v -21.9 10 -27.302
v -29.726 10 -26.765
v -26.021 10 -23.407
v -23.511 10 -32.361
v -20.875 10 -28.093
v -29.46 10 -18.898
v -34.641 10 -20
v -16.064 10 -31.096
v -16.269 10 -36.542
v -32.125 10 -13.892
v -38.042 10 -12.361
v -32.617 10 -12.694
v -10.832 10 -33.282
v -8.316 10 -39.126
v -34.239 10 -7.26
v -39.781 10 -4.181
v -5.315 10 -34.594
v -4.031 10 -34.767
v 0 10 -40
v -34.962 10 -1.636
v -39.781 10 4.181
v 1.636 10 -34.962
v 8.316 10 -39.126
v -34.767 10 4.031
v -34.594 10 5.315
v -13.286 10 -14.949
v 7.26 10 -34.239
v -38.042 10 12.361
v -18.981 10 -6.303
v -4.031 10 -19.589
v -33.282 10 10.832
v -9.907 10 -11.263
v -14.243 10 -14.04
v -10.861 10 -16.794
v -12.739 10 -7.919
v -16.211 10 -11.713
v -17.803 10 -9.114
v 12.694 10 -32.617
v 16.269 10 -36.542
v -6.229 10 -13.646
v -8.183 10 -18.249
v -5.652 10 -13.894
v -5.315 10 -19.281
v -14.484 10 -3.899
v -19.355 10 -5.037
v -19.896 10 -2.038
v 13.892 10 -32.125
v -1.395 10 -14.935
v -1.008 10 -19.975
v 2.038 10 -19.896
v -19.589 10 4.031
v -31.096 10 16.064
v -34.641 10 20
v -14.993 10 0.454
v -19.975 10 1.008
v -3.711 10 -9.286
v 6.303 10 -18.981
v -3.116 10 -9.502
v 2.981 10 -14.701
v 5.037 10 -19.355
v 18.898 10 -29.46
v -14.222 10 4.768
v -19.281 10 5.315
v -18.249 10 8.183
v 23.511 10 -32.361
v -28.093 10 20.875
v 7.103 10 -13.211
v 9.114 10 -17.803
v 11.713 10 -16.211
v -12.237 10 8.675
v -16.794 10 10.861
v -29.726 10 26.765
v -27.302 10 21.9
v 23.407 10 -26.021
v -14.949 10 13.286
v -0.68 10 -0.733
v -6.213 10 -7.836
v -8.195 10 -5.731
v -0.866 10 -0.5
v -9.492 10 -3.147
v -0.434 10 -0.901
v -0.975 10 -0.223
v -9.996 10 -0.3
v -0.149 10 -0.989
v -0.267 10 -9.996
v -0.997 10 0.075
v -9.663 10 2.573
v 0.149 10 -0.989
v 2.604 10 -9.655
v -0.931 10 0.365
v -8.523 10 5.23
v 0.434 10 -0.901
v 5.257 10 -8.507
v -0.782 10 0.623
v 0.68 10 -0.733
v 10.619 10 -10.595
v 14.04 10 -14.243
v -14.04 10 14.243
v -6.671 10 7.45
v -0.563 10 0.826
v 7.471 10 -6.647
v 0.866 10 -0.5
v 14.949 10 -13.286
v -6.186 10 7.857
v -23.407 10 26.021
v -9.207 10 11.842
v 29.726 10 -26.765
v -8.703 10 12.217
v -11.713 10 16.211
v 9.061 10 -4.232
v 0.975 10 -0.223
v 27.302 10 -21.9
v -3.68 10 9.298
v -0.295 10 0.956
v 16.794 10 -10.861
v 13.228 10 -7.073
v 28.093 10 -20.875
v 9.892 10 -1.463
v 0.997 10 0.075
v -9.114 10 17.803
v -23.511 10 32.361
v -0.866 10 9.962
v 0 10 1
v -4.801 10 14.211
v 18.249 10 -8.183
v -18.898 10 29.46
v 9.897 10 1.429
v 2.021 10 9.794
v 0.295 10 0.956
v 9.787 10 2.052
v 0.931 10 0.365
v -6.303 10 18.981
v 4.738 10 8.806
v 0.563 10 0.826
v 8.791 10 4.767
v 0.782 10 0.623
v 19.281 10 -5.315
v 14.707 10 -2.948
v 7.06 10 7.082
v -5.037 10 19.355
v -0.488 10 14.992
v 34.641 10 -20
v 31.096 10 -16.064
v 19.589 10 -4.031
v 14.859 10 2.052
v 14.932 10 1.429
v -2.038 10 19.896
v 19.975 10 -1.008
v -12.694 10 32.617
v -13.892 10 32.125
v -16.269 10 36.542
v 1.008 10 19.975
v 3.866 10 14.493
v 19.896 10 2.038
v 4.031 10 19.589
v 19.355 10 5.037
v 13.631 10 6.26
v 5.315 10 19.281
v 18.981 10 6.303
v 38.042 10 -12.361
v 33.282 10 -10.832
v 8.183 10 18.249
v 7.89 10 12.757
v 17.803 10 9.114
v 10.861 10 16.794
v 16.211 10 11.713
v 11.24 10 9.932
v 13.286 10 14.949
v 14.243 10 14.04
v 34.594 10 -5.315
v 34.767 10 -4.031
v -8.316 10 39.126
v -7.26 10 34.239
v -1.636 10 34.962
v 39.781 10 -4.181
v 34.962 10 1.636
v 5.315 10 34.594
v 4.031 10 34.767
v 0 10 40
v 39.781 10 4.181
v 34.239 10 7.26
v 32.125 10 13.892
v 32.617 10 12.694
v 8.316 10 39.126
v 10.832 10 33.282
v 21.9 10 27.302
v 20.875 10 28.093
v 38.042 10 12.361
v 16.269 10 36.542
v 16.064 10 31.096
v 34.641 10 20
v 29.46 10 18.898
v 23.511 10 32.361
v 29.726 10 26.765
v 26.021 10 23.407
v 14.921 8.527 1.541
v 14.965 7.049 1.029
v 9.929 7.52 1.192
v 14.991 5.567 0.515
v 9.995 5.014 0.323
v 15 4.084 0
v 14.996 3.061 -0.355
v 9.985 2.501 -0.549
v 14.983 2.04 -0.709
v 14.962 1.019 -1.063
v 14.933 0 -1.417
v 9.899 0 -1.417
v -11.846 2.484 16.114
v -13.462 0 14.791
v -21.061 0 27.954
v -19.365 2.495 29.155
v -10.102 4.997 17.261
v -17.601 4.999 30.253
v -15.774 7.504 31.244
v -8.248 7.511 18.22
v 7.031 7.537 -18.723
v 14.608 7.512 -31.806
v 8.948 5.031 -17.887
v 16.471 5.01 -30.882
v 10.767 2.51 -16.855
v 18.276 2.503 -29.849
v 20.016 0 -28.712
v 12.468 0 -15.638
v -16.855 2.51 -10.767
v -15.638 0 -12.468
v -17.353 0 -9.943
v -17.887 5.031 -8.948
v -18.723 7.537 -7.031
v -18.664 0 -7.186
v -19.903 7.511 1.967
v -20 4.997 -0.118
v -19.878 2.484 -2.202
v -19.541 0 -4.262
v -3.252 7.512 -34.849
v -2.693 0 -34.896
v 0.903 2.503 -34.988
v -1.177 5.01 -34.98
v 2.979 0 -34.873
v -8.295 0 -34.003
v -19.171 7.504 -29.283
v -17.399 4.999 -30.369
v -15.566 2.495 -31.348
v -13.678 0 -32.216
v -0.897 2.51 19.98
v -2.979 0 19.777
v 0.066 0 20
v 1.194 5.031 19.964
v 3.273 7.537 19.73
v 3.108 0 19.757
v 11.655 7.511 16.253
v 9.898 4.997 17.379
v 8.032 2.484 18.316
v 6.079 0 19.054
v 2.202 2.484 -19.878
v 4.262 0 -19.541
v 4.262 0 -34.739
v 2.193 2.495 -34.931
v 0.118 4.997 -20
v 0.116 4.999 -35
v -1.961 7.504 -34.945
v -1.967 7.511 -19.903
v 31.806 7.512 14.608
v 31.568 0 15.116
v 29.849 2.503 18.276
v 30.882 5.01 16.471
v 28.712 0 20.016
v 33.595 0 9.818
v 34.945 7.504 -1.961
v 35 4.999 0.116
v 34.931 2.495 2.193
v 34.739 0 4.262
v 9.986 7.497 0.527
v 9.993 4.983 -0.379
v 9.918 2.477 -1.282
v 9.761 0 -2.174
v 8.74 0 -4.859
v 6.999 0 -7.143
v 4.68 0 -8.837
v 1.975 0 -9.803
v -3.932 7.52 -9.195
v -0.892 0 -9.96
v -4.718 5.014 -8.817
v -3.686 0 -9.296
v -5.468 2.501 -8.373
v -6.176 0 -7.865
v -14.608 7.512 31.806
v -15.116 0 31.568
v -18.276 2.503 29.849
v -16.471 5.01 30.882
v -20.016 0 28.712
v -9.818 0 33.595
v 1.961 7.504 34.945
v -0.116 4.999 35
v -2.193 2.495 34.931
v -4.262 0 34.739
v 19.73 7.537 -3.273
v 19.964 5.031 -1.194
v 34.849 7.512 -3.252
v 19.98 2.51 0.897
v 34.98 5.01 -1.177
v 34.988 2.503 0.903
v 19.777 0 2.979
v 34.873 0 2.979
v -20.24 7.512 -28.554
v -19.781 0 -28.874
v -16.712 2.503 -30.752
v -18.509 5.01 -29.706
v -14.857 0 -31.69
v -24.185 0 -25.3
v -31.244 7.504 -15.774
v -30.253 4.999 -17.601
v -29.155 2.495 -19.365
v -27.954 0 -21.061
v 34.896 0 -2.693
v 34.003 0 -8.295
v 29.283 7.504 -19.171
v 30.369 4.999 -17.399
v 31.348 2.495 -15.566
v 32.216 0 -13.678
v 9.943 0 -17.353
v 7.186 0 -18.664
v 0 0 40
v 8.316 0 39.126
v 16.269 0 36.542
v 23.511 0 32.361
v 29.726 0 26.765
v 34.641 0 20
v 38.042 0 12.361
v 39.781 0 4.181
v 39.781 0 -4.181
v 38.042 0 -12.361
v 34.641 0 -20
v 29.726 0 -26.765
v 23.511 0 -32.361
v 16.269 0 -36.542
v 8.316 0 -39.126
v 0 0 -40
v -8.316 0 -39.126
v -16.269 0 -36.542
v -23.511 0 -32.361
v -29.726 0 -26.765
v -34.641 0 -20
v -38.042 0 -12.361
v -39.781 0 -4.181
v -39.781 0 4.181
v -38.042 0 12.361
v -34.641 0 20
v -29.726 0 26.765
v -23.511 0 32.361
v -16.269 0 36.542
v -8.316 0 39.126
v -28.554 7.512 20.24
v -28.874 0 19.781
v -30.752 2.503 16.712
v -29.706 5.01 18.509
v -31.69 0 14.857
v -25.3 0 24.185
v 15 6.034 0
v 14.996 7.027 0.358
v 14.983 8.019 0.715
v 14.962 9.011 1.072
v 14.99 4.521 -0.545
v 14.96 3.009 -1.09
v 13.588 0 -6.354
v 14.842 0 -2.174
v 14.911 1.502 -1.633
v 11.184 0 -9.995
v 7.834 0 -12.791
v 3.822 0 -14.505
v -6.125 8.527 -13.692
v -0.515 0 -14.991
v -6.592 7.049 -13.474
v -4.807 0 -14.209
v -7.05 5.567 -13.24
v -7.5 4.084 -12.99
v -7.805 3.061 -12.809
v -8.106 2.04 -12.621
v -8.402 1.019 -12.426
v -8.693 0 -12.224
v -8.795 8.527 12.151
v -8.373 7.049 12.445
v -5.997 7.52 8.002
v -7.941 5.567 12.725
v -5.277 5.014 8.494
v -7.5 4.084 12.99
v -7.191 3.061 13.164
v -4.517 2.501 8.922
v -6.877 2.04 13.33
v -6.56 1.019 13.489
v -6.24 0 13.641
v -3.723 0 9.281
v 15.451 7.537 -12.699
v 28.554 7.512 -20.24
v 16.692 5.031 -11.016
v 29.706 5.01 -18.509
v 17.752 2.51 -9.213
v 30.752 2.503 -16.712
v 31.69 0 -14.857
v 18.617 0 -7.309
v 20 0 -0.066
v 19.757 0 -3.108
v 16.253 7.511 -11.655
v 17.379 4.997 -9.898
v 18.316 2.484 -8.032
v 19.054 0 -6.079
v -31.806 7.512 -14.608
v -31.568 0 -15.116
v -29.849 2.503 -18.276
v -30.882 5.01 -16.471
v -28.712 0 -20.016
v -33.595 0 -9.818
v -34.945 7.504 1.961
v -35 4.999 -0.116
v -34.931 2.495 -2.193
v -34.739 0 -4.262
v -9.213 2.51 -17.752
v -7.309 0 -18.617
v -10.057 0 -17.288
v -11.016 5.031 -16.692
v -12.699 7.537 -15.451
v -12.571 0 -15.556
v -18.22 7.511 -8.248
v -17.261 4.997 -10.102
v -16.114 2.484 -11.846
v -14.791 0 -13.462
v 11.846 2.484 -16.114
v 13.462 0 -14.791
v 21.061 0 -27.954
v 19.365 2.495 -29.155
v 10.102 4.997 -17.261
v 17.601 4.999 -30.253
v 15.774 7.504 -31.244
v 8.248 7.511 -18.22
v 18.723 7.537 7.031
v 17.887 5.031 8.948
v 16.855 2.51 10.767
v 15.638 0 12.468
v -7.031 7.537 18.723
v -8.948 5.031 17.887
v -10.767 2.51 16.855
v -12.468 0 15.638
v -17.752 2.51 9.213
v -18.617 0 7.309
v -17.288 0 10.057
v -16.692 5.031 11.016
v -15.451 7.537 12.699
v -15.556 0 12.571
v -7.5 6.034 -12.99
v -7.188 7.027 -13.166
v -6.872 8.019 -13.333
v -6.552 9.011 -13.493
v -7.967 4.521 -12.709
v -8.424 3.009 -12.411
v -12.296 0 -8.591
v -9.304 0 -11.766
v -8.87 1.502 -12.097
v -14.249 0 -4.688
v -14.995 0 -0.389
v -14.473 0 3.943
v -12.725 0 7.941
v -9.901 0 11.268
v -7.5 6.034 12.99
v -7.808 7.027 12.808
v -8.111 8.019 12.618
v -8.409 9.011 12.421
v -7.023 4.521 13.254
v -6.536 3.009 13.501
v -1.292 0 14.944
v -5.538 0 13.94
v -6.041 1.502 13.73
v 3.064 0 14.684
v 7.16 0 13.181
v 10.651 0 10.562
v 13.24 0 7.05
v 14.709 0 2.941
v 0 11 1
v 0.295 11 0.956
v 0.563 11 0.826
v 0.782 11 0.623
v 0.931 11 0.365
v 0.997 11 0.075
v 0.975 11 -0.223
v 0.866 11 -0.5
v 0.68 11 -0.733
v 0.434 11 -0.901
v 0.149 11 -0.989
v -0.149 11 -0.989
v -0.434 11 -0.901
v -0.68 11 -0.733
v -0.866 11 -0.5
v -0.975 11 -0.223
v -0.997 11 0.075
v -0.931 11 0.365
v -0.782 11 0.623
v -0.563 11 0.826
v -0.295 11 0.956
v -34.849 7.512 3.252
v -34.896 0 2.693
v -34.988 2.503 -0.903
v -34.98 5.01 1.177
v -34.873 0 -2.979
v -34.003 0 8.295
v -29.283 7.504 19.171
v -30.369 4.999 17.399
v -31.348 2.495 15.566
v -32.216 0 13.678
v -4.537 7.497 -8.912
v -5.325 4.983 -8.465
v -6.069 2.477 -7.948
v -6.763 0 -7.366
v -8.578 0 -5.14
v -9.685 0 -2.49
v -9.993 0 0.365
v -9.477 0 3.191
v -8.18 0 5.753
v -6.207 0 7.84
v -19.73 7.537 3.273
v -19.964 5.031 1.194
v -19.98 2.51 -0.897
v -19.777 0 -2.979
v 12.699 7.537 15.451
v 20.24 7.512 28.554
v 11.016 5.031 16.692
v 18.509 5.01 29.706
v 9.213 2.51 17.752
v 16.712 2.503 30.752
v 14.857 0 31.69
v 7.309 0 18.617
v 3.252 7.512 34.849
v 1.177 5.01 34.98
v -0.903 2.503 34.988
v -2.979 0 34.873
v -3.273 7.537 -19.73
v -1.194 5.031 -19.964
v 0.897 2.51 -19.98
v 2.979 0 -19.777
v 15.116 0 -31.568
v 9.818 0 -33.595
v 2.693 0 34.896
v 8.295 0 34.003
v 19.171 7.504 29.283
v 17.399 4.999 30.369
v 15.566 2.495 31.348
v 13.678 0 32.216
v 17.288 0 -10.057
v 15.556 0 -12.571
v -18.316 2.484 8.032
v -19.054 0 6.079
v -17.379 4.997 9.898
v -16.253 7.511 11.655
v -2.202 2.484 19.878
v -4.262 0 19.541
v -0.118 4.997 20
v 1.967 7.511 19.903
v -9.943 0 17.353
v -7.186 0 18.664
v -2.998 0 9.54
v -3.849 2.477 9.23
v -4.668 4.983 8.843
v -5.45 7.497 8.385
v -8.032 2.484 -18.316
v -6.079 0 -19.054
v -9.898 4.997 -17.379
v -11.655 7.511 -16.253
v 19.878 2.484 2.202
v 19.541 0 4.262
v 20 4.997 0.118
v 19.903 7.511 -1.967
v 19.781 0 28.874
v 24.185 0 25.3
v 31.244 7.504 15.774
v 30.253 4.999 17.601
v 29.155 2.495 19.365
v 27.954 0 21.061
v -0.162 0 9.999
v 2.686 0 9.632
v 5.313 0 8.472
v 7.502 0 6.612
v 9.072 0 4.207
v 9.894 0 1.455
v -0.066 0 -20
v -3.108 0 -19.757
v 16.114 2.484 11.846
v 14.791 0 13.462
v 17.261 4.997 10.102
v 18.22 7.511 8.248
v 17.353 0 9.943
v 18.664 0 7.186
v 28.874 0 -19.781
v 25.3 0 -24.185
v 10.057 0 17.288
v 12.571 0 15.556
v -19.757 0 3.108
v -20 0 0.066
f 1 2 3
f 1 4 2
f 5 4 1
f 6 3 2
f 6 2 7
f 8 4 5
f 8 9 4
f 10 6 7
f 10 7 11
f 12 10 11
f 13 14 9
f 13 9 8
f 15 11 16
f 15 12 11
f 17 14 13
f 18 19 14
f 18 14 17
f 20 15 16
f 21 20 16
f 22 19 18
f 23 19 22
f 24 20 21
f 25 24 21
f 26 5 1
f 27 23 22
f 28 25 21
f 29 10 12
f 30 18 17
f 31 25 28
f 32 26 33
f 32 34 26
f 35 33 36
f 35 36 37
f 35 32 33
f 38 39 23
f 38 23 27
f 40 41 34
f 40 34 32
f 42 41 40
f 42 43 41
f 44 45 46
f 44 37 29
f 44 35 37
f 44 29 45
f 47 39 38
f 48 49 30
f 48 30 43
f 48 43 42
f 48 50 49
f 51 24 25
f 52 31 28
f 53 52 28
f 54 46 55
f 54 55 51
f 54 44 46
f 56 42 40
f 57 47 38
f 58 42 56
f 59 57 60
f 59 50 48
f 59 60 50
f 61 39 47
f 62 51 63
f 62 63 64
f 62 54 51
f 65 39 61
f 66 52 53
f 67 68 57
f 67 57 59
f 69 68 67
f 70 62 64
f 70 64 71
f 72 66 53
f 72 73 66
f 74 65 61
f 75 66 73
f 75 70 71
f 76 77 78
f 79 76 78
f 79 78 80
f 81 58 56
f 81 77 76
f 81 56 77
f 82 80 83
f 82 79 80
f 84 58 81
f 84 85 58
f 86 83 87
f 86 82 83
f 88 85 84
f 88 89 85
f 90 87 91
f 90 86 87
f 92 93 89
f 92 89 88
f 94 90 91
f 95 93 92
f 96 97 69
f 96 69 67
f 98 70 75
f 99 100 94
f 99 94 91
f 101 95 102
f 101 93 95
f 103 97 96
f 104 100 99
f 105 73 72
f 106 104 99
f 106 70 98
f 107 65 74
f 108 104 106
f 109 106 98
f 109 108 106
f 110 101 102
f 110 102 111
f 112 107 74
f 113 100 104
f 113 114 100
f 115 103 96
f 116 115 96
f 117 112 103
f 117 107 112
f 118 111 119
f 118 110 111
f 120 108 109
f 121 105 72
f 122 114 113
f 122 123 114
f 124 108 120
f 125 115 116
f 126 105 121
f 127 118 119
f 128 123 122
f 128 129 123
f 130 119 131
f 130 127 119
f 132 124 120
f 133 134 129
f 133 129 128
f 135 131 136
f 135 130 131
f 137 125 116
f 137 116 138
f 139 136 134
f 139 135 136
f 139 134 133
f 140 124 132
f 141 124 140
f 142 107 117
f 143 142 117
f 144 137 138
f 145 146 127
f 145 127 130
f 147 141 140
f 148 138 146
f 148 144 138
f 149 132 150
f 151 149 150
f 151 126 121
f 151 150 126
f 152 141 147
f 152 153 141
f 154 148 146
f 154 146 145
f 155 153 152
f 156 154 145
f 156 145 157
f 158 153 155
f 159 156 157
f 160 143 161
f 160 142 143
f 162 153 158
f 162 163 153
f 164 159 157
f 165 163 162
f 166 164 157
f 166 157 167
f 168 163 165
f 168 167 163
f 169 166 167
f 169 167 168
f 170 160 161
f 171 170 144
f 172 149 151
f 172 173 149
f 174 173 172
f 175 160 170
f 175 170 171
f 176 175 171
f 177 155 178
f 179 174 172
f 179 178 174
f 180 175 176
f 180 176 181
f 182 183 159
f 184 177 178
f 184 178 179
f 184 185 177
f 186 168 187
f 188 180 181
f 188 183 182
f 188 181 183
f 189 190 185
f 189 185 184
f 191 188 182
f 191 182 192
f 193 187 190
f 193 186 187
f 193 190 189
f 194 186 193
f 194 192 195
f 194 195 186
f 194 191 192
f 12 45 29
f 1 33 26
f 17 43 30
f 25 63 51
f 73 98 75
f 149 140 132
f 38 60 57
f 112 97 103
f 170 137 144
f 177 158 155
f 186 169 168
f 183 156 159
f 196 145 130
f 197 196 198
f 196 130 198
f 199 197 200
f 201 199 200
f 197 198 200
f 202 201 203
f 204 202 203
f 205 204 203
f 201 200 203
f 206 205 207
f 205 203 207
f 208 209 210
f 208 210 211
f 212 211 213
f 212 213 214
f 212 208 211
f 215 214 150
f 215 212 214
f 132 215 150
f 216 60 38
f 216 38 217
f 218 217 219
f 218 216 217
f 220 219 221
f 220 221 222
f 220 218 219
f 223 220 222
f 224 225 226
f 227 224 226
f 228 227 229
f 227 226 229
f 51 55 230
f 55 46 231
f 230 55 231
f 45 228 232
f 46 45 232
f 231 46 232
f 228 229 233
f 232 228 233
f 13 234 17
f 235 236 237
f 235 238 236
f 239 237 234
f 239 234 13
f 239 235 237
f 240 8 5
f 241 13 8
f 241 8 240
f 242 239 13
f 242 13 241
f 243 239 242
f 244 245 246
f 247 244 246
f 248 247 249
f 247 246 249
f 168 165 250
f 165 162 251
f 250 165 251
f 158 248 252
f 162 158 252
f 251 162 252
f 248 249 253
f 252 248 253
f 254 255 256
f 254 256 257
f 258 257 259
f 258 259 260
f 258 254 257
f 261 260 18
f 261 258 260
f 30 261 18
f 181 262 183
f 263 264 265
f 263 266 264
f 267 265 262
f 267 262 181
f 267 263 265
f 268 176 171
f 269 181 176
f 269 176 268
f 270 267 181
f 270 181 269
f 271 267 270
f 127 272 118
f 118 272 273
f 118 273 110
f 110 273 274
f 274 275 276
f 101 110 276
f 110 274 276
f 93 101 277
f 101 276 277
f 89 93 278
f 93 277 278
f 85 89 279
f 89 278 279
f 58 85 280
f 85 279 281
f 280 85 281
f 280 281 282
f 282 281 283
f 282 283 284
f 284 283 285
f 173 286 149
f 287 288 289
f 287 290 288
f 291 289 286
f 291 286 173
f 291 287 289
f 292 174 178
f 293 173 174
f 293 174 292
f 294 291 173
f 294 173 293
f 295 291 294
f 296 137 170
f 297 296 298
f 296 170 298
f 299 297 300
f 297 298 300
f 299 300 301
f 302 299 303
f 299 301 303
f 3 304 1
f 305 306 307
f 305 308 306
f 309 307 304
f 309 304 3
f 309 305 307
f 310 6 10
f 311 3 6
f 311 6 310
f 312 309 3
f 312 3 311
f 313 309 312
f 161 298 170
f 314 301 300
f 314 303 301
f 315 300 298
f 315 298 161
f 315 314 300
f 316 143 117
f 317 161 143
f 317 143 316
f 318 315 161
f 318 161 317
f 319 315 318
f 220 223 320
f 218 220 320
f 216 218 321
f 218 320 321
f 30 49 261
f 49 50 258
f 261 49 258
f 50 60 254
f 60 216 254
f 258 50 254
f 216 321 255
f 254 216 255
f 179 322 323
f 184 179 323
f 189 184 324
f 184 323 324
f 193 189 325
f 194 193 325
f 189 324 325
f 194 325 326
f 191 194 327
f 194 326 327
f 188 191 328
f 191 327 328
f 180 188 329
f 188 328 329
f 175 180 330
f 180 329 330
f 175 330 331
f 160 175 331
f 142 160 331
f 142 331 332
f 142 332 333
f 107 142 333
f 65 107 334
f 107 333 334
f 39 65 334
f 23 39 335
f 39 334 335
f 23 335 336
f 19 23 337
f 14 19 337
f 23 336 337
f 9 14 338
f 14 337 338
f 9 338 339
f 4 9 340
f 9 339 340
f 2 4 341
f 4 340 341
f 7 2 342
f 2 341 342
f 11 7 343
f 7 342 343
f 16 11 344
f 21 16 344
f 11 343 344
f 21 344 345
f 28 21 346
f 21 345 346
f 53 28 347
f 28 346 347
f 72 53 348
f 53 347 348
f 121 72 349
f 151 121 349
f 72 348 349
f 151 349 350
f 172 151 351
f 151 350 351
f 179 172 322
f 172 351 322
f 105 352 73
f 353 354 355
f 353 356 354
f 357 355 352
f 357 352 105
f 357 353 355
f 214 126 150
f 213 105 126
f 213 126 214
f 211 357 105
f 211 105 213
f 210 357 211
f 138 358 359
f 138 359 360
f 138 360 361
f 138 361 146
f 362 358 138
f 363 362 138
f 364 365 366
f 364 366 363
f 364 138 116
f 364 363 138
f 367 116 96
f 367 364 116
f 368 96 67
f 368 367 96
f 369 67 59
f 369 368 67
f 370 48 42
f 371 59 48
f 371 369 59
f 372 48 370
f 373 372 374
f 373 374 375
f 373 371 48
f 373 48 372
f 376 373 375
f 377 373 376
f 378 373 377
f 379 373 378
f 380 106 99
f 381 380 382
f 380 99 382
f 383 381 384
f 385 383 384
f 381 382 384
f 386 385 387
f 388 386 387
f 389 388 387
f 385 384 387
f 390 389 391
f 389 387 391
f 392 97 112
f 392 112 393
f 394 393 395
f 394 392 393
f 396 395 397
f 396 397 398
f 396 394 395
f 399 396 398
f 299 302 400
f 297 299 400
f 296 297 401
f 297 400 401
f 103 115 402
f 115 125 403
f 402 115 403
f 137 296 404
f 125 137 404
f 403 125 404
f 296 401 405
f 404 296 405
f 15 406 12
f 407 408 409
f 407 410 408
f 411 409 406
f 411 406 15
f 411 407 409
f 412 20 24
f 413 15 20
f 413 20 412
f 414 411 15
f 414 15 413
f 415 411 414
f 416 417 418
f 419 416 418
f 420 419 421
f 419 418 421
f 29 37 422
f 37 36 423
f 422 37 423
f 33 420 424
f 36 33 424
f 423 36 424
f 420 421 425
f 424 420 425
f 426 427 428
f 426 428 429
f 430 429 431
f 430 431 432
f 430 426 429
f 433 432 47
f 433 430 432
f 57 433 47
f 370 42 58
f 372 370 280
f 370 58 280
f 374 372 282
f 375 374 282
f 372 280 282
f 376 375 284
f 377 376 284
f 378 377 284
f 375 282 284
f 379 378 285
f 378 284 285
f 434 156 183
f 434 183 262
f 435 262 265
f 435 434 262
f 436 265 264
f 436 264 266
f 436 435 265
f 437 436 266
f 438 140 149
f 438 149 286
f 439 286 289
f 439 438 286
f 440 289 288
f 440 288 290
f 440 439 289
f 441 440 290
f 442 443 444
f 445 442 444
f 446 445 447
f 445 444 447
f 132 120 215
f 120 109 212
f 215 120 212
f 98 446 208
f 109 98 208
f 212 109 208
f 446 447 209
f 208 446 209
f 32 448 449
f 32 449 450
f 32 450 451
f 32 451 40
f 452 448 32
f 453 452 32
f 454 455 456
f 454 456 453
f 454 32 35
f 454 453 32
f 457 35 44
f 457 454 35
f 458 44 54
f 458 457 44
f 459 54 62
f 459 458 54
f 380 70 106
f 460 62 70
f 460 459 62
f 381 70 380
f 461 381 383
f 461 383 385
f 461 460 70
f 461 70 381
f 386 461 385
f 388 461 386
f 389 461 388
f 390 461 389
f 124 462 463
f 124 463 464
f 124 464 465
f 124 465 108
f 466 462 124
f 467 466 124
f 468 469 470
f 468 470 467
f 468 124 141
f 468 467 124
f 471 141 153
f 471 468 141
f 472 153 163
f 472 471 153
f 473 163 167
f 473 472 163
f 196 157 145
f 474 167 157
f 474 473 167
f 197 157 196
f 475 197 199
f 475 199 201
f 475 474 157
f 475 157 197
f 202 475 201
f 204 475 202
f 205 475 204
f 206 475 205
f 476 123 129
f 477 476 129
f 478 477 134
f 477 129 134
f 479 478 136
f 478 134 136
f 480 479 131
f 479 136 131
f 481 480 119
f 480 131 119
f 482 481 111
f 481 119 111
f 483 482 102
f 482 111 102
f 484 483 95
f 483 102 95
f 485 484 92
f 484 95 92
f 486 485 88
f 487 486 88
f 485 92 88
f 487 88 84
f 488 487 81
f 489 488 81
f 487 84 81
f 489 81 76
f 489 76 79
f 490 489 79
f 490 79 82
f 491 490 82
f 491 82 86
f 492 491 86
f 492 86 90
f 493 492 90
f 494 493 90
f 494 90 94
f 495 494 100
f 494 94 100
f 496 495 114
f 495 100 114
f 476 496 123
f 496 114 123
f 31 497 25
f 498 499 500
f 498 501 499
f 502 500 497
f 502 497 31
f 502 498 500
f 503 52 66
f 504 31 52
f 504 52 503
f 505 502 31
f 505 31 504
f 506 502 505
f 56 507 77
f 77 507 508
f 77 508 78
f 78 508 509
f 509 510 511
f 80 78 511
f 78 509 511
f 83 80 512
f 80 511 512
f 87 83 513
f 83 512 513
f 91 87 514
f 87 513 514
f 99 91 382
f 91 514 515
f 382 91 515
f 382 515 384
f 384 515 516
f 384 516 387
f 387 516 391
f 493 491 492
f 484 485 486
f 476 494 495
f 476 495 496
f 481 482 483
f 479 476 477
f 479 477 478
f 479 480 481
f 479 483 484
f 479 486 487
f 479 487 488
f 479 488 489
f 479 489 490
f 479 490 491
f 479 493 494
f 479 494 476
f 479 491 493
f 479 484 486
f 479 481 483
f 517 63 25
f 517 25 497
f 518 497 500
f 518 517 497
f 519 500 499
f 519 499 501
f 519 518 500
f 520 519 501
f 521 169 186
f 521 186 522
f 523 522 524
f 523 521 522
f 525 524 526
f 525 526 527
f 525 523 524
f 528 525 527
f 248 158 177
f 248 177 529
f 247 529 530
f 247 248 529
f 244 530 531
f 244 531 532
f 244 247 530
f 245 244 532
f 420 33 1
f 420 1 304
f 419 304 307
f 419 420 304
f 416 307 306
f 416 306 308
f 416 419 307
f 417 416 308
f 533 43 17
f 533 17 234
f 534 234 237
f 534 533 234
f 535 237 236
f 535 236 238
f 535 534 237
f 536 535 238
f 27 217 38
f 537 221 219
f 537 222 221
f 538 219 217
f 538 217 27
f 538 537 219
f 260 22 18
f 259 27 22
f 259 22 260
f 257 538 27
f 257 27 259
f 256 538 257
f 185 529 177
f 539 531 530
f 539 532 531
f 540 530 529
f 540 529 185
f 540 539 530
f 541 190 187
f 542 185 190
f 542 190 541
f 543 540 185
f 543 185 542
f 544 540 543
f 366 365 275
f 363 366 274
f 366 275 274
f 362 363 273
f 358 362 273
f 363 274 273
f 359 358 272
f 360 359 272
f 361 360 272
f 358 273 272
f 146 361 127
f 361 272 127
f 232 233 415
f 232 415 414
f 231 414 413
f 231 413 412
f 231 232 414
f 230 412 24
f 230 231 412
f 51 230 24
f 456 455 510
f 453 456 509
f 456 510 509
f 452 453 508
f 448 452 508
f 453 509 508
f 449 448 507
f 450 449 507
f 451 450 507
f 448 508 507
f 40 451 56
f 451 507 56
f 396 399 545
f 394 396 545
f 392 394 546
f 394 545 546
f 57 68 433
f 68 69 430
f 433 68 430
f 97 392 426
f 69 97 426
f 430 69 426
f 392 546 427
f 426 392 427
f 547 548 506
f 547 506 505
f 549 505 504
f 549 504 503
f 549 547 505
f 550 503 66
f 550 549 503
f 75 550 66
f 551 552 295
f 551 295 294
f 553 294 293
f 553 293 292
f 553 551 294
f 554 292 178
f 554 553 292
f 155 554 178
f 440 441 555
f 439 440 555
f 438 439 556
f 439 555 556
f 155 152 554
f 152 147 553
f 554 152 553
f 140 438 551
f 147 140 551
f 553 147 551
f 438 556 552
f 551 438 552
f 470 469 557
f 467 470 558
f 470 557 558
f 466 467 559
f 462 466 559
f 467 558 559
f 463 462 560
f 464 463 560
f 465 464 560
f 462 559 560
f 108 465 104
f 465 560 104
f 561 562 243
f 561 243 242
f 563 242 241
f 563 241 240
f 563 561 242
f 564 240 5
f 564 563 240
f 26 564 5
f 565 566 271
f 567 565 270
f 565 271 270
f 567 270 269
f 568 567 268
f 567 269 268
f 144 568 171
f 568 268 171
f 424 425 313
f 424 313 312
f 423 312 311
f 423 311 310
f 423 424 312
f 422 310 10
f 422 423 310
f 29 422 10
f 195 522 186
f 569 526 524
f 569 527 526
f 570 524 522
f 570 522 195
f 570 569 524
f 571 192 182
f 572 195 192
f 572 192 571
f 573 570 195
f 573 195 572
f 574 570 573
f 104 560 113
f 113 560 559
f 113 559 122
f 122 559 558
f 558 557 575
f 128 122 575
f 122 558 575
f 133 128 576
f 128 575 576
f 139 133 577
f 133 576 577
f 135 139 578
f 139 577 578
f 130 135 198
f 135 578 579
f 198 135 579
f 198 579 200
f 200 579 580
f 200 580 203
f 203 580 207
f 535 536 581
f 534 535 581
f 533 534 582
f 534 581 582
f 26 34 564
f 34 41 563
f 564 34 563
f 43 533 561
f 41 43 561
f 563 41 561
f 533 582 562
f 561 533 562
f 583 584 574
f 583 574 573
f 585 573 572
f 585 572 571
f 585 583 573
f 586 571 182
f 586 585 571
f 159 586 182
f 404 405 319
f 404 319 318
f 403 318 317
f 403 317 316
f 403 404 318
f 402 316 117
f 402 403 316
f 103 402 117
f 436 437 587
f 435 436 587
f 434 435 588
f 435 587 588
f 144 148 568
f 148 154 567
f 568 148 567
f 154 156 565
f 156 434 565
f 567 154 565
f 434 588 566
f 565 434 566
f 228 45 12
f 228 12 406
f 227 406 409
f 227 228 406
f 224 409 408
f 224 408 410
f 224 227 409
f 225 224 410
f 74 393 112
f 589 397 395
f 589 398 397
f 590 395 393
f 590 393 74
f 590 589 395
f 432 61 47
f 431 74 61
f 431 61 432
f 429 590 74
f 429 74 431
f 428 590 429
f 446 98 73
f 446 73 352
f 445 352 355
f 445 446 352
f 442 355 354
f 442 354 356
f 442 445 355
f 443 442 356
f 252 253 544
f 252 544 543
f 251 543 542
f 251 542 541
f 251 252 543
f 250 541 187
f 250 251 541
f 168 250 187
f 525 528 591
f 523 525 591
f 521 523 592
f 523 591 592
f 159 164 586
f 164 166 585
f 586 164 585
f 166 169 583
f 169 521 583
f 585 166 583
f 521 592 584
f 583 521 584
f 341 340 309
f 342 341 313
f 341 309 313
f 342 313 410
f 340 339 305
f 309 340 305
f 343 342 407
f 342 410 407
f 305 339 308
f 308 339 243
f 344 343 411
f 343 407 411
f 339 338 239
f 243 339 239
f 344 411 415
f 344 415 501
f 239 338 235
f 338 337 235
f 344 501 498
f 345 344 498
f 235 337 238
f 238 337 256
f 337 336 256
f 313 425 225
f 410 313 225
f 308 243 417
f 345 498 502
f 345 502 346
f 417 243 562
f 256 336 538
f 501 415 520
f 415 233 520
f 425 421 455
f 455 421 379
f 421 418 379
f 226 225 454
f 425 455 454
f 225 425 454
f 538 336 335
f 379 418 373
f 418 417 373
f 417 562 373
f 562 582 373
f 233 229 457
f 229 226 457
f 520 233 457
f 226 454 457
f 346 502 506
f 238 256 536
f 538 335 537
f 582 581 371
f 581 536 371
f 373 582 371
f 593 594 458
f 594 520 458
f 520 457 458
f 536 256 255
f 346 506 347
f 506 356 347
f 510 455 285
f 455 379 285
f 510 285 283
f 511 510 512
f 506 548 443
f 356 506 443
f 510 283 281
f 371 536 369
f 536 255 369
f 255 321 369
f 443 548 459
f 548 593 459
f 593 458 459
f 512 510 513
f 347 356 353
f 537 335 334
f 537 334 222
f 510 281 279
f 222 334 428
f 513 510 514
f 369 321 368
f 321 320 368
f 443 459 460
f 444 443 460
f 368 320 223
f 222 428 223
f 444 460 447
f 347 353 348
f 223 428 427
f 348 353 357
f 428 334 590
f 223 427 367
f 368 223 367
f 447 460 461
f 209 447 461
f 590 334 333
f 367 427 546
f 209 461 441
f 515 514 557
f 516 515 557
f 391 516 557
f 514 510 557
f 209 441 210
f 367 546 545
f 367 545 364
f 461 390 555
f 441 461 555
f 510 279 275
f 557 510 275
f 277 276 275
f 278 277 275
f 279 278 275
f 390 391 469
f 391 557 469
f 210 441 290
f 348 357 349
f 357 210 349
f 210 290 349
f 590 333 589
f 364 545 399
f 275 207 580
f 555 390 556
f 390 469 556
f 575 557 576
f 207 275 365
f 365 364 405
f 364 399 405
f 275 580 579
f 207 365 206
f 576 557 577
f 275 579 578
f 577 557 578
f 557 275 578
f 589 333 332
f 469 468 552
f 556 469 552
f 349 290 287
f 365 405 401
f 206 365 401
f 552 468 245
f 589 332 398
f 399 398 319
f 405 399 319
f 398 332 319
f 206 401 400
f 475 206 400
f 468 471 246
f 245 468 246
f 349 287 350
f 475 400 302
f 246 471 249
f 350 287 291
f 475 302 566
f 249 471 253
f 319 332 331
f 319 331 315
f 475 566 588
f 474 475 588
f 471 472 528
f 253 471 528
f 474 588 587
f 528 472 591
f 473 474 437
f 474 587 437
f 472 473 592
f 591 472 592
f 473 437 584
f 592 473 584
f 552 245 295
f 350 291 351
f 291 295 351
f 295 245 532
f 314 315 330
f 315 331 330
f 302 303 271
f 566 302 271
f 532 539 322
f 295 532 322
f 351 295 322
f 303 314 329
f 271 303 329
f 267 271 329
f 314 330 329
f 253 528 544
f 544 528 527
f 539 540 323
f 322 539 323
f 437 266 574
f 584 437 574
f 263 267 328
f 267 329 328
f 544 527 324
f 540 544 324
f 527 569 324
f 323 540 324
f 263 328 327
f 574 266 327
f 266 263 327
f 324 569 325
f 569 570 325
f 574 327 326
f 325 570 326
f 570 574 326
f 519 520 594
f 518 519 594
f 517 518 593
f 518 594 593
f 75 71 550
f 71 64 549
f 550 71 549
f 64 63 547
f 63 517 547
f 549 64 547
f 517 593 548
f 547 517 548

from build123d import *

# Parameters (mm, degrees)
SKETCH1_R                            = 10
BOSS_EXTRUDE1_DEPTH                  = 10
SKETCH1_R_2                          = 20
SKETCH1_R_3                          = 15
BOSS_EXTRUDE1_2_DEPTH                = 10
SKETCH1_R_4                          = 40
SKETCH1_R_5                          = 35
BOSS_EXTRUDE1_3_DEPTH                = 10
BOSS_EXTRUDE2_REACH                  = 89.446
BOSS_EXTRUDE2_END_RADIUS             = 35
BOSS_EXTRUDE2_START                  = 30
BOSS_EXTRUDE2_DIRECTION_2_REACH      = 89.446
BOSS_EXTRUDE2_DIRECTION_2_END_RADIUS = 20
CIRPATTERN1_COUNT                    = 12
BOSS_EXTRUDE3_START                  = 9.76079
BOSS_EXTRUDE3_DEPTH                  = 5.23921
CIRPATTERN3_COUNT                    = 3
SKETCH6_R                            = 1
BOSS_EXTRUDE4_DEPTH                  = 1


with BuildPart() as part:
    # Sketch1 → Boss-Extrude1 (new body)
    with BuildSketch(Plane(origin=(0, 0, 0), x_dir=(1, 0, 0), z_dir=(0, 1, 0))):
        with Locations(Location((0, 0, 0), (0, 0, 270))):
            Circle(SKETCH1_R)
    extrude(amount=BOSS_EXTRUDE1_DEPTH)



with BuildPart() as body_2:
    # Sketch1 → Boss-Extrude1 2 (new body)
    with BuildSketch(Plane(origin=(0, 0, 0), x_dir=(1, 0, 0), z_dir=(0, 1, 0))):
        with Locations(Location((0, 0, 0), (0, 0, 270))):
            Circle(SKETCH1_R_2)
        with Locations(Location((0, 0, 0), (0, 0, 270))):
            Circle(SKETCH1_R_3, mode=Mode.SUBTRACT)
    extrude(amount=BOSS_EXTRUDE1_2_DEPTH)


with BuildPart() as body_3:
    # Sketch1 → Boss-Extrude1 3 (new body)
    with BuildSketch(Plane(origin=(0, 0, 0), x_dir=(1, 0, 0), z_dir=(0, 1, 0))):
        with Locations(Location((0, 0, 0), (0, 0, 270))):
            Circle(SKETCH1_R_4)
        with Locations(Location((0, 0, 0), (0, 0, 270))):
            Circle(SKETCH1_R_5, mode=Mode.SUBTRACT)
    extrude(amount=BOSS_EXTRUDE1_3_DEPTH)


    add(body_2.part)  # Boss-Extrude2 merges body 2
    # Boss-Extrude2: up to this cylinder (the profile starts inside it)
    boss_extrude2_end = Plane(origin=(0, 5, 0), z_dir=(0, -1, 0)) * Cylinder(BOSS_EXTRUDE2_END_RADIUS, 249.892, mode=Mode.PRIVATE)
    # Sketch4 → Boss-Extrude2 (add, up to the surface)
    with BuildSketch(Plane(origin=(0, 0, 0), x_dir=(0, 0, -1), z_dir=(1, 0, 0)).offset(BOSS_EXTRUDE2_START), mode=Mode.PRIVATE) as boss_extrude2_sk1:
        Polygon((-4.262410526, 0), (4.031443844, 10), (5.315133993, 10), (-2.978720377, 0), align=None)
    boss_extrude2_tool1 = extrude(boss_extrude2_sk1.sketch, amount=BOSS_EXTRUDE2_REACH, mode=Mode.PRIVATE) & boss_extrude2_end
    boss_extrude2 = boss_extrude2_tool1.solids().sort_by_distance((30, 5, -0.526362))[0]
    add(boss_extrude2)

    # Boss-Extrude2 direction 2: up to this cylinder (the profile starts outside it)
    boss_extrude2_direction_2_end = Plane(origin=(0, 5, 0), z_dir=(0, -1, 0)) * Cylinder(BOSS_EXTRUDE2_DIRECTION_2_END_RADIUS, 219.892, mode=Mode.PRIVATE)
    # Sketch4 → Boss-Extrude2 direction 2 (add, up to the surface)
    with BuildSketch(Plane(origin=(0, 0, 0), x_dir=(0, 0, -1), z_dir=(1, 0, 0)).offset(BOSS_EXTRUDE2_START), mode=Mode.PRIVATE) as boss_extrude2_direction_2_sk1:
        Polygon((-4.262410526, 0), (4.031443844, 10), (5.315133993, 10), (-2.978720377, 0), align=None)
    boss_extrude2_direction_2_tool1 = extrude(boss_extrude2_direction_2_sk1.sketch, amount=-BOSS_EXTRUDE2_DIRECTION_2_REACH, mode=Mode.PRIVATE) - boss_extrude2_direction_2_end
    boss_extrude2_direction_2 = boss_extrude2_direction_2_tool1.solids().sort_by_distance((30, 5, -0.526362))[0]
    add(boss_extrude2_direction_2)
    boss_extrude2 = boss_extrude2 + boss_extrude2_direction_2  # both directions under the feature's name, for the pattern or mirror that repeats it

    # CirPattern1: Boss-Extrude2 ×12 about axis
    cirpattern1_axis = Axis((0, 0, 0), (0, 1, 0))
    for i in range(1, CIRPATTERN1_COUNT):
        add(boss_extrude2.rotate(cirpattern1_axis, i * 360 / CIRPATTERN1_COUNT))


with BuildPart() as part_1:
    add(part.part)

    add(body_3.part)  # Boss-Extrude3 merges body 3
    # Sketch5 → Boss-Extrude3 (add)
    with BuildSketch(Plane(origin=(0, 0, 0), x_dir=(0, 0, -1), z_dir=(1, 0, 0)).offset(BOSS_EXTRUDE3_START)):
        Polygon((-2.0524403, 10), (1.416675924, 0), (2.174160553, 0), (-1.428789261, 10), align=None)
    boss_extrude3 = extrude(amount=BOSS_EXTRUDE3_DEPTH)

    # CirPattern3: Boss-Extrude3 ×3 about axis
    cirpattern3_axis = Axis((0, 0, 0), (0, 1, 0))
    for i in range(1, CIRPATTERN3_COUNT):
        add(boss_extrude3.rotate(cirpattern3_axis, i * 360 / CIRPATTERN3_COUNT))

    # Sketch6 → Boss-Extrude4 (add)
    with BuildSketch(Plane(origin=(0, 10, 0), x_dir=(1, 0, 0), z_dir=(0, 1, 0))):
        with Locations(Location((0, 0, 0), (0, 0, 270))):
            Circle(SKETCH6_R)
    extrude(amount=BOSS_EXTRUDE4_DEPTH)


solid = part_1.part
